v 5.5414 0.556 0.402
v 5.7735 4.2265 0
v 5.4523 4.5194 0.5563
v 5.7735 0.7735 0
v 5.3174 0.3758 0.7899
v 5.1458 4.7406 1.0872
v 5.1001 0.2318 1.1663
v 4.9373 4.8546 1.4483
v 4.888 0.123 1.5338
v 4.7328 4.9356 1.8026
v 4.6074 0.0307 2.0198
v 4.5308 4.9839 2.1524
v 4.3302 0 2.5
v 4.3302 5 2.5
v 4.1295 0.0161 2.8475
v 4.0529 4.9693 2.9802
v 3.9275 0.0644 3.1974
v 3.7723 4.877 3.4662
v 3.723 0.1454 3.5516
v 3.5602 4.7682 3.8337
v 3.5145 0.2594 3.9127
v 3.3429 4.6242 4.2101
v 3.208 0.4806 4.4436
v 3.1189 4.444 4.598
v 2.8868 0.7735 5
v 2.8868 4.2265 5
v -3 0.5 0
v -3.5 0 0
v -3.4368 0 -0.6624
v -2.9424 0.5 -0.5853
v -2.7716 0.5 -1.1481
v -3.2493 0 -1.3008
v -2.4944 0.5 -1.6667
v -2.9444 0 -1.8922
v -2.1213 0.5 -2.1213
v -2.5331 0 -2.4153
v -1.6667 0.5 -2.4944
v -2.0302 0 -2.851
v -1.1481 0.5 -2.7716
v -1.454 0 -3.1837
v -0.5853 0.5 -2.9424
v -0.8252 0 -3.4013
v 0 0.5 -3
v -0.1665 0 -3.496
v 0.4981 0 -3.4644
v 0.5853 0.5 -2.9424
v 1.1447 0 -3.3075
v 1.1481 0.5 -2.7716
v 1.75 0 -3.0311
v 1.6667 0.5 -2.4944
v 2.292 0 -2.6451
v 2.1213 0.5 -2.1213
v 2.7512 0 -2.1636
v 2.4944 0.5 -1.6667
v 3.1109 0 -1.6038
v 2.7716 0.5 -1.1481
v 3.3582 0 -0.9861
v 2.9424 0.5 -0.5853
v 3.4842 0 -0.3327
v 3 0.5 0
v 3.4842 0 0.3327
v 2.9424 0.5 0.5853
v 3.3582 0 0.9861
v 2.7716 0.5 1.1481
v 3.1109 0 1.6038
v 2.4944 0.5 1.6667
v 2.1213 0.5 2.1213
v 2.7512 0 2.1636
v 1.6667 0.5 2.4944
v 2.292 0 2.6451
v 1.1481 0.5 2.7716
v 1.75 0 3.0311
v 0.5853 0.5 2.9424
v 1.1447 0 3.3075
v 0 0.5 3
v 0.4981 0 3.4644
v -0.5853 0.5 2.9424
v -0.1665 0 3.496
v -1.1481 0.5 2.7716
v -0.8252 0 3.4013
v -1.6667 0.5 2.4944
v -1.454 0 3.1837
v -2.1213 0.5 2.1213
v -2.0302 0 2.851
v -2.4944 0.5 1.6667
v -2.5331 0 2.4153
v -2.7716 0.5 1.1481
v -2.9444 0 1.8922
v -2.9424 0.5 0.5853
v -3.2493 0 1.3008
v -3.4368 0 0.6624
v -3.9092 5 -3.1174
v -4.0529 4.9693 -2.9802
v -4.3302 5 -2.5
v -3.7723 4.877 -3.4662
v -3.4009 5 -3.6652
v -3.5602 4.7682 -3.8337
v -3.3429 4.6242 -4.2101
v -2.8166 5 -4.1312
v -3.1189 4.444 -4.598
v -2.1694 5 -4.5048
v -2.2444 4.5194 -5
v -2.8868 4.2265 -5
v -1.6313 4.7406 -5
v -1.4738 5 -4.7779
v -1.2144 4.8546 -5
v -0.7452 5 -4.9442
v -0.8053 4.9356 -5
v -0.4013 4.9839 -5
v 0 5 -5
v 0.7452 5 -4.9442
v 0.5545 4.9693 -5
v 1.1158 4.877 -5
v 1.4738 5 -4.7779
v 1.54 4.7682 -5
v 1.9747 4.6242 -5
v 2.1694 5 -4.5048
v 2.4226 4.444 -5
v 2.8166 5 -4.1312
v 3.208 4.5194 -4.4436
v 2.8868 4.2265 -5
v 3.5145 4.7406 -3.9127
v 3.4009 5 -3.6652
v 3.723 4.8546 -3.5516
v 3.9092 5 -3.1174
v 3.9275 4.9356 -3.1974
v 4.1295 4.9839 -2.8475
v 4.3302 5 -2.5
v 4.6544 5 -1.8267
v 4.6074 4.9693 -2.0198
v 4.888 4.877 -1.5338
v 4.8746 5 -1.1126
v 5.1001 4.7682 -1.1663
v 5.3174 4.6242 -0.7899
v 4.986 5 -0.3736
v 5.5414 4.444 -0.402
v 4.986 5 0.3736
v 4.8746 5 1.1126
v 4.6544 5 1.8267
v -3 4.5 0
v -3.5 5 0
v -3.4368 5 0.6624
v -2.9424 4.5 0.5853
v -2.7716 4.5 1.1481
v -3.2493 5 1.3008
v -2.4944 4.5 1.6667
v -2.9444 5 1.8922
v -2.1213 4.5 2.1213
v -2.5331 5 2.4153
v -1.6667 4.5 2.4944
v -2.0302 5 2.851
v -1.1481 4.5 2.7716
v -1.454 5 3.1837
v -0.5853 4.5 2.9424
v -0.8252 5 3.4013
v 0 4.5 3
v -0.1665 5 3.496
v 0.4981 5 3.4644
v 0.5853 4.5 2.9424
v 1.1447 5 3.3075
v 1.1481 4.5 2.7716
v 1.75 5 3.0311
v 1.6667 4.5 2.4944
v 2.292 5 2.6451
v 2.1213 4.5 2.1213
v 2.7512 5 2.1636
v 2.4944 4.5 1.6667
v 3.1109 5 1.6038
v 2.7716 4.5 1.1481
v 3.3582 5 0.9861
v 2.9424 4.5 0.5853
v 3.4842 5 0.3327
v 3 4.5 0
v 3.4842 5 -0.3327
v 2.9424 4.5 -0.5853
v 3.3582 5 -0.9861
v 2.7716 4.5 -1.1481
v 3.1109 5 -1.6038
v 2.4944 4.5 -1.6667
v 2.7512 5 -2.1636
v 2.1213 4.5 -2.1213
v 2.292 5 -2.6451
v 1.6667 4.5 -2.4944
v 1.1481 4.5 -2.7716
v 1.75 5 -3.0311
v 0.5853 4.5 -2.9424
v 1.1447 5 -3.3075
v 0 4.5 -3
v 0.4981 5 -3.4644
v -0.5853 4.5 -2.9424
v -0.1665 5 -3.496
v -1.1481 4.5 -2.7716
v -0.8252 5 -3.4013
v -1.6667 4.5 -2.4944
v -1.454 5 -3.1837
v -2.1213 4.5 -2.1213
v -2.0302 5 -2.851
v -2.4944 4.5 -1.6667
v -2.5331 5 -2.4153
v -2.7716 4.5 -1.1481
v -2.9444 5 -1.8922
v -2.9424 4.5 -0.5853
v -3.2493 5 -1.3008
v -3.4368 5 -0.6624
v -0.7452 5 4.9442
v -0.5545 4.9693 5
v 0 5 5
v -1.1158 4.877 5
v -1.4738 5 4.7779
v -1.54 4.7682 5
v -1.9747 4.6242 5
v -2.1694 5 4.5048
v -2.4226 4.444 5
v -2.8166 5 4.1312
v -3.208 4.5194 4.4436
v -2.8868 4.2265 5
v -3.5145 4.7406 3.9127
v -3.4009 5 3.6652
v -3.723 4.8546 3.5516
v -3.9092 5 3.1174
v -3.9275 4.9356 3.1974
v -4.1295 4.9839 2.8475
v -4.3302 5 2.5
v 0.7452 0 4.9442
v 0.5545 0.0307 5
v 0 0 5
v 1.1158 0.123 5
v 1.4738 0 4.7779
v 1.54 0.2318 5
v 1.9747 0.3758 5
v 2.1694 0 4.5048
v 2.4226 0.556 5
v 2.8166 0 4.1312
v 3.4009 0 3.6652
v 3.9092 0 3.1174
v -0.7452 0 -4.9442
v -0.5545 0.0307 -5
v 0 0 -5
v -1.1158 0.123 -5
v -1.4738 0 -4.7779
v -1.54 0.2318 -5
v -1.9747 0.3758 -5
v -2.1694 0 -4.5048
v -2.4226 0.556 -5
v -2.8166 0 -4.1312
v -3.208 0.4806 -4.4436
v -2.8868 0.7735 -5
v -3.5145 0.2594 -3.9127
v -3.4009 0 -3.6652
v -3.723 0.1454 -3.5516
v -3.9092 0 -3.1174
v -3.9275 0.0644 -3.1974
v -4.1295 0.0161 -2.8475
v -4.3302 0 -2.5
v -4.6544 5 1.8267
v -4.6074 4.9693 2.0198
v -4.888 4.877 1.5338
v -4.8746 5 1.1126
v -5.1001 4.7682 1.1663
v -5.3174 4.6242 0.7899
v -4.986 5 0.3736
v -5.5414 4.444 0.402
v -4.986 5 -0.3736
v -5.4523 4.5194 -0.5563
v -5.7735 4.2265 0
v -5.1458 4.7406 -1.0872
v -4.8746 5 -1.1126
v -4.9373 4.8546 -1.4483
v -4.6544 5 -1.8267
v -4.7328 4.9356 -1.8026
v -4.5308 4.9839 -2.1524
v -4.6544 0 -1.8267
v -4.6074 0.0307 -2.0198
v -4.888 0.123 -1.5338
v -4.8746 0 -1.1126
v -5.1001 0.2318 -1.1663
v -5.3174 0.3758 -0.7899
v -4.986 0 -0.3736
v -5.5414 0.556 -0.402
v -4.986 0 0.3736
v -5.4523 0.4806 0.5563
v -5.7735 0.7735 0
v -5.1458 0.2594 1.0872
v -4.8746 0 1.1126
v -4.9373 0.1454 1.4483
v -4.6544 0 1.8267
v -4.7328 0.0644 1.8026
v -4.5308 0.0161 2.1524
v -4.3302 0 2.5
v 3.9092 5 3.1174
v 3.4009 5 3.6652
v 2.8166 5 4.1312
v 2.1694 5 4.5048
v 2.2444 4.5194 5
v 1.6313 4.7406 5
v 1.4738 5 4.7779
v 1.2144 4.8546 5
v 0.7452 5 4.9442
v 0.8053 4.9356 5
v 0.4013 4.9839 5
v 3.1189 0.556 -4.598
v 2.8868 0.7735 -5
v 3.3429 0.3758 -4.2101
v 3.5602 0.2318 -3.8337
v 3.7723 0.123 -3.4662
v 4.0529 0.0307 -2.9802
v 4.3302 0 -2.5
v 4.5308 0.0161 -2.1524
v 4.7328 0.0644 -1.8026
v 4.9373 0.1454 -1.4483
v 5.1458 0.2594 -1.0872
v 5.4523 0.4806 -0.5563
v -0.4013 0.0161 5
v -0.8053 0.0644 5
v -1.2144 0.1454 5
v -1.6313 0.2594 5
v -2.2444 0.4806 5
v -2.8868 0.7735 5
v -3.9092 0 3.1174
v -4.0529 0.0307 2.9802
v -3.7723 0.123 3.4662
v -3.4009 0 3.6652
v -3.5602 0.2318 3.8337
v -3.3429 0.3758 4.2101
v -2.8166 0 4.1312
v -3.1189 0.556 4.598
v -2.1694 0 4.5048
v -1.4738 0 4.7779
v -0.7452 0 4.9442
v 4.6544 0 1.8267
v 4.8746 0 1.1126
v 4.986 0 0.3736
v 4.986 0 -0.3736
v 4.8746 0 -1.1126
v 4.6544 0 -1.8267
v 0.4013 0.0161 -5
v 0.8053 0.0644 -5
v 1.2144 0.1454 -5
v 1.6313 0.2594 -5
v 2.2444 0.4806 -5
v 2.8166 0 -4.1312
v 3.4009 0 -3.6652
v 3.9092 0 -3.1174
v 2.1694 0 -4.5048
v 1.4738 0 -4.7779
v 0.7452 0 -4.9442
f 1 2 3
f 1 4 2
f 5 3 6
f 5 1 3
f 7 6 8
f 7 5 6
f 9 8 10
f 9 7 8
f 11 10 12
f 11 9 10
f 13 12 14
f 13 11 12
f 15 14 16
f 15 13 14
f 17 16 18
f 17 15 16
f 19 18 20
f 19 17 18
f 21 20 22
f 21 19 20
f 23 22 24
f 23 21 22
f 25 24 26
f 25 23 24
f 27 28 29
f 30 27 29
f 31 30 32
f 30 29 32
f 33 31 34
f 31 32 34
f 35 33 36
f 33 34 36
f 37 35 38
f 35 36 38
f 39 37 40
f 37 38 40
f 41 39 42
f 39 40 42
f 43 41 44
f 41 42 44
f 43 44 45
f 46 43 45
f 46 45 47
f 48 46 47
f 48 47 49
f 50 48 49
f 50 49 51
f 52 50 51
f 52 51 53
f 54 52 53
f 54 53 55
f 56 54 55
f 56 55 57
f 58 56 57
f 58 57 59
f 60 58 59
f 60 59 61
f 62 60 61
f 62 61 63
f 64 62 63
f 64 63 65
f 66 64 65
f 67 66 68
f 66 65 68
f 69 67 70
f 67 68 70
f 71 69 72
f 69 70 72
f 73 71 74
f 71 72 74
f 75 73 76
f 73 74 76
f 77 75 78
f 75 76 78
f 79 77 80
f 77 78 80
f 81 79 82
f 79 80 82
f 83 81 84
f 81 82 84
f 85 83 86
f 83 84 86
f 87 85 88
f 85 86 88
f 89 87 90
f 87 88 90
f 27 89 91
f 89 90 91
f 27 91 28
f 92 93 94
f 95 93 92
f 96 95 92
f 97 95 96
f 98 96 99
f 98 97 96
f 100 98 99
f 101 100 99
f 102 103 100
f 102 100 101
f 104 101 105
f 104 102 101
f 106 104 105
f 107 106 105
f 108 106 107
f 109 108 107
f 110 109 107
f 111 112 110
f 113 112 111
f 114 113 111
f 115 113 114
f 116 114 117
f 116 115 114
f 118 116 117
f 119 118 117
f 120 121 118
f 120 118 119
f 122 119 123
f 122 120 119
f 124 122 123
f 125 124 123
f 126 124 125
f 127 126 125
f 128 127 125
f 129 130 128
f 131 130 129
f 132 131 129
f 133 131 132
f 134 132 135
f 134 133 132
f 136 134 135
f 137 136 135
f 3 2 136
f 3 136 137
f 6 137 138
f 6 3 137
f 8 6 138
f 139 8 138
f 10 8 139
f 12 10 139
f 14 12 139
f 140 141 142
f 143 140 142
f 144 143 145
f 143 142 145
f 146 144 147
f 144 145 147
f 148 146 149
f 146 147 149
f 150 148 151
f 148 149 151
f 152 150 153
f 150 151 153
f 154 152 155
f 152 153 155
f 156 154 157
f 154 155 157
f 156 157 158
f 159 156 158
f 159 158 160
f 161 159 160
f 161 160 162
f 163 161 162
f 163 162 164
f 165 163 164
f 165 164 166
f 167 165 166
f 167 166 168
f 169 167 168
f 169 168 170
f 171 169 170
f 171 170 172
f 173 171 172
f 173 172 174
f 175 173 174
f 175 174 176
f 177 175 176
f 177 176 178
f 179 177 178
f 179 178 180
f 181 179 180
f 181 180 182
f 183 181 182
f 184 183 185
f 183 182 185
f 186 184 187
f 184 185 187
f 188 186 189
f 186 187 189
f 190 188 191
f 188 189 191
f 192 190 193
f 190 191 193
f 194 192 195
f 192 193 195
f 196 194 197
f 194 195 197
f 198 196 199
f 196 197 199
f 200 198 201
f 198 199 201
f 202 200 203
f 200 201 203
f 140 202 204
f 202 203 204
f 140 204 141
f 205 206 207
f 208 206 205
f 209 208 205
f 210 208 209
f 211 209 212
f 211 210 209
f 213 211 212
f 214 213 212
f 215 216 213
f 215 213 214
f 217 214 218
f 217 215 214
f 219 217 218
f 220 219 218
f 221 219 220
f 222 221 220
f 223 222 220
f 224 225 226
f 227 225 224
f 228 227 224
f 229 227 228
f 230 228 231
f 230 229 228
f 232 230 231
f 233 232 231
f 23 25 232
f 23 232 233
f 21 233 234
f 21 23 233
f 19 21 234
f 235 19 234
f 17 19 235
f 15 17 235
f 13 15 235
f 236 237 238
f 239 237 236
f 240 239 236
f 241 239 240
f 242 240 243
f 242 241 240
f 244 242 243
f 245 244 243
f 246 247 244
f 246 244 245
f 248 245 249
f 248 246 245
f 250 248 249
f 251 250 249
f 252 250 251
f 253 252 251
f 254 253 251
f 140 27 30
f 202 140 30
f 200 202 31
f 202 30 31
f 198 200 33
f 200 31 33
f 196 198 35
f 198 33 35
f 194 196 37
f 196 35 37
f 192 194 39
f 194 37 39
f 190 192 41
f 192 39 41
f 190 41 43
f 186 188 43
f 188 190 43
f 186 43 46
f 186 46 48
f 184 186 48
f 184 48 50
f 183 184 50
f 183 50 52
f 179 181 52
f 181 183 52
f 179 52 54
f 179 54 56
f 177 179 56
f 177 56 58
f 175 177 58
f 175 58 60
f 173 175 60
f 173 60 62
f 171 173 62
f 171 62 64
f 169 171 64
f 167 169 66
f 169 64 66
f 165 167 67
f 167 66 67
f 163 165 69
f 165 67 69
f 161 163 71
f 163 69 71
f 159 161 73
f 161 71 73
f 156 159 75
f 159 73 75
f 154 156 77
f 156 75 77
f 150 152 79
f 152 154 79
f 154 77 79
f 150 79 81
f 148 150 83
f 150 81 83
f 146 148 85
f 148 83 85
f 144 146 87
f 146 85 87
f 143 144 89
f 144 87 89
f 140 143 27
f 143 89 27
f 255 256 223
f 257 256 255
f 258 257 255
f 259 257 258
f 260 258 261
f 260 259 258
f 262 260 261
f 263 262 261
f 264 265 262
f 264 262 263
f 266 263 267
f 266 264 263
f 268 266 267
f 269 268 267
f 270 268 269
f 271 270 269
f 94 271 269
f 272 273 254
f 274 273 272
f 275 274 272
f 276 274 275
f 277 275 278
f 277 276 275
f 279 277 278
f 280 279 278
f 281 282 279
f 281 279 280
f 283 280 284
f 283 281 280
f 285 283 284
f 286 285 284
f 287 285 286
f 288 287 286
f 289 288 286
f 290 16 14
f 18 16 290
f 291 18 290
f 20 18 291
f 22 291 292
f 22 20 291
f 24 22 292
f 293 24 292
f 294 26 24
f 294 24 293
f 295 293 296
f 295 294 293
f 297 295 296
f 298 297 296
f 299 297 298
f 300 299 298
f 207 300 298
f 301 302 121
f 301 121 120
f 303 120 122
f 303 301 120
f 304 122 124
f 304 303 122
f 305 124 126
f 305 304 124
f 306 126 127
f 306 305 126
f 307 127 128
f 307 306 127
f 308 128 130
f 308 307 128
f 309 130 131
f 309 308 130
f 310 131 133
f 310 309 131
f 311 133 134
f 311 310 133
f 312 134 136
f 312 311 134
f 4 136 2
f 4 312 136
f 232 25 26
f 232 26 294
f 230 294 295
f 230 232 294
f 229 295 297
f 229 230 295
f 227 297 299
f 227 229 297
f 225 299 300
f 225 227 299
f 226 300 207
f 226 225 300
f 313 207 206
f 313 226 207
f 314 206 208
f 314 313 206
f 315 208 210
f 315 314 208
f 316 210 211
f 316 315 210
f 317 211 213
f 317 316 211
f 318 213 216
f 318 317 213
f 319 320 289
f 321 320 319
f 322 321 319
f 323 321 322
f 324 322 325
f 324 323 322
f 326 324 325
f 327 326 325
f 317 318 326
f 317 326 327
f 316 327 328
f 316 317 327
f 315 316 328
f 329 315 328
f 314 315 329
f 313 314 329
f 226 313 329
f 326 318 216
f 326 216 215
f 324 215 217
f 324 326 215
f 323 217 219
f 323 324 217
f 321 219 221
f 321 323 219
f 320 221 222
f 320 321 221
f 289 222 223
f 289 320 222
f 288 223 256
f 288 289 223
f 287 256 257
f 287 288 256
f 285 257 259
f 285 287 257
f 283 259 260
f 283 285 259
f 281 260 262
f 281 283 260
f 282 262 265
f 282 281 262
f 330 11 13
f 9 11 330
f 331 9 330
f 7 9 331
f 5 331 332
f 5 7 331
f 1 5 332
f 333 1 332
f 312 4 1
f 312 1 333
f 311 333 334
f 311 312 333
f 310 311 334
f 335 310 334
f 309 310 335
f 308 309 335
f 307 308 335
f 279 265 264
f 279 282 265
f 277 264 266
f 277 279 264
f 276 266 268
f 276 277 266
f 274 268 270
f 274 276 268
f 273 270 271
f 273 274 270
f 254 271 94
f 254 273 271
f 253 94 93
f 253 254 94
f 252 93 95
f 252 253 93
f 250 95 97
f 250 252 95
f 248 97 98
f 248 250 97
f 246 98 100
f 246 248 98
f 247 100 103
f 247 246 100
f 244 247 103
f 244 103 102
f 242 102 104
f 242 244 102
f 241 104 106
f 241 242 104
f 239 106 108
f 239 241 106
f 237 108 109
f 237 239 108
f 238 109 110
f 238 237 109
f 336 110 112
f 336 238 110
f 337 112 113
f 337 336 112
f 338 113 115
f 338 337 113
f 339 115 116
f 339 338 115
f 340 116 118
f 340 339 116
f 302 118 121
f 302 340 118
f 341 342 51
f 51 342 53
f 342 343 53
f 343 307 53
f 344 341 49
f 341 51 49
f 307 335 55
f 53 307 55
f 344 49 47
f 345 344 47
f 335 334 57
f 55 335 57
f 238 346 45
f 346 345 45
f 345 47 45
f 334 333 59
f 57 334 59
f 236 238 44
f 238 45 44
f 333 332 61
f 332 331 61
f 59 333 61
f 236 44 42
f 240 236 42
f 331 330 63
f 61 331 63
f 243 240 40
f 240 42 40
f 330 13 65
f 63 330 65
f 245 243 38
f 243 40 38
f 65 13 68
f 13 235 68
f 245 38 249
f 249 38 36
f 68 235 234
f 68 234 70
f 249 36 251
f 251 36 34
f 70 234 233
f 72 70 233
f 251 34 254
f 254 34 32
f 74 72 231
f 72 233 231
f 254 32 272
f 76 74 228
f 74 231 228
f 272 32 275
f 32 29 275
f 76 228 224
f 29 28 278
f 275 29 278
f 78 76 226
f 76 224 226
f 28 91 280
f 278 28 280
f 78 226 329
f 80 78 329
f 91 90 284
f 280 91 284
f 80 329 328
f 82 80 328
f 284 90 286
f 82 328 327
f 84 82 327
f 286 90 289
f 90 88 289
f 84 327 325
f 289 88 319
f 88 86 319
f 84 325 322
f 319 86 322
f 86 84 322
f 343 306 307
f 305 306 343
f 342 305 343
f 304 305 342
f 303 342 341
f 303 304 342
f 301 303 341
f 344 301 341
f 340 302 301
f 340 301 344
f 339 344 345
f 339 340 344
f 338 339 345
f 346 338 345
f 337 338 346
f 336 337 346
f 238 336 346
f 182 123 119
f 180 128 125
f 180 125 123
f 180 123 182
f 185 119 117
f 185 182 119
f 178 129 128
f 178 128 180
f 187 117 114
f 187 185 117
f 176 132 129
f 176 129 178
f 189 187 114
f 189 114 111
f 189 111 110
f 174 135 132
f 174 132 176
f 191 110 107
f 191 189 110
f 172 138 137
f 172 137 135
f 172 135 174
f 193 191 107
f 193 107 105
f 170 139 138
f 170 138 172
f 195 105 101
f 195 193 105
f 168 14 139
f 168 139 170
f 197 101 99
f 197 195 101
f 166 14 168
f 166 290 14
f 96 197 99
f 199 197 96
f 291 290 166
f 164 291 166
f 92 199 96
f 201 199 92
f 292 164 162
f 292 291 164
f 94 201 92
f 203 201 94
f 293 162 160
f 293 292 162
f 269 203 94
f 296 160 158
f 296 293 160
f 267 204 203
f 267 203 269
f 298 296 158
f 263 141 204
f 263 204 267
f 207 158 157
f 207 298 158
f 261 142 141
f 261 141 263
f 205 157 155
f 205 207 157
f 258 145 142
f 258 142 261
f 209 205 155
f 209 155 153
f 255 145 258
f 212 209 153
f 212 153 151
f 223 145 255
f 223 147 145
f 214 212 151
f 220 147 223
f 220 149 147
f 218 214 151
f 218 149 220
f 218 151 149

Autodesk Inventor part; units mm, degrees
ref_plane "YZ Plane" through (0, 0, 0) normal (1, 0, 0) x (0, 1, 0)
ref_plane "XZ Plane" through (0, 0, 0) normal (0, 1, 0) x (-1, 0, 0)
ref_plane "XY Plane" through (0, 0, 0) normal (0, 0, 1) x (1, 0, 0)
sketch "Esboço1" plane through (0, 0, 0) normal (0, 1, 0) x (-1, 0, 0)
  circle A0 centre (0, 0) radius 3
  line L0 (-2.8868, -5) -> (-5.7735, 0)
  line L1 (-5.7735, 0) -> (-2.8868, 5)
  line L2 (-2.8868, 5) -> (2.8868, 5)
  line L3 (2.8868, 5) -> (5.7735, 0)
  line L4 (5.7735, 0) -> (2.8868, -5)
  line L5 (2.8868, -5) -> (-2.8868, -5)
  dimension "d0" = 6
extrude "Extrusão1" add sketch "Esboço1" along normal blind 5
thread "Rosca1" size "1/4-20 UNC" class "2B" standard "ANSI Unified Screw Threads" full length
sketch "Esboço2" plane through (0, 0, 0) normal (1, 0, 0) x (0, 1, 0)
  point P0 (0, 0)
chamfer "Chanfro1" distance 0.5 angle 45 2 edges at (3, 0, 0) (3, 5, 0)
sketch "Esboço5" plane through (0, 0, 0) normal (0, -1, 0) x (1, 0, 0)
  circle A0 centre (0, 0) radius 5
extrude "Extrusão2" cut sketch "Esboço5" against normal through all draft 45 keep common part
sketch "Esboço6" plane through (0, 5, 0) normal (0, 1, 0) x (1, 0, 0)
  circle A0 centre (0, 0) radius 5
extrude "Extrusão3" cut sketch "Esboço6" against normal through all draft 45 keep common part
properties part number "porca m6" material "Aço inoxidável"
